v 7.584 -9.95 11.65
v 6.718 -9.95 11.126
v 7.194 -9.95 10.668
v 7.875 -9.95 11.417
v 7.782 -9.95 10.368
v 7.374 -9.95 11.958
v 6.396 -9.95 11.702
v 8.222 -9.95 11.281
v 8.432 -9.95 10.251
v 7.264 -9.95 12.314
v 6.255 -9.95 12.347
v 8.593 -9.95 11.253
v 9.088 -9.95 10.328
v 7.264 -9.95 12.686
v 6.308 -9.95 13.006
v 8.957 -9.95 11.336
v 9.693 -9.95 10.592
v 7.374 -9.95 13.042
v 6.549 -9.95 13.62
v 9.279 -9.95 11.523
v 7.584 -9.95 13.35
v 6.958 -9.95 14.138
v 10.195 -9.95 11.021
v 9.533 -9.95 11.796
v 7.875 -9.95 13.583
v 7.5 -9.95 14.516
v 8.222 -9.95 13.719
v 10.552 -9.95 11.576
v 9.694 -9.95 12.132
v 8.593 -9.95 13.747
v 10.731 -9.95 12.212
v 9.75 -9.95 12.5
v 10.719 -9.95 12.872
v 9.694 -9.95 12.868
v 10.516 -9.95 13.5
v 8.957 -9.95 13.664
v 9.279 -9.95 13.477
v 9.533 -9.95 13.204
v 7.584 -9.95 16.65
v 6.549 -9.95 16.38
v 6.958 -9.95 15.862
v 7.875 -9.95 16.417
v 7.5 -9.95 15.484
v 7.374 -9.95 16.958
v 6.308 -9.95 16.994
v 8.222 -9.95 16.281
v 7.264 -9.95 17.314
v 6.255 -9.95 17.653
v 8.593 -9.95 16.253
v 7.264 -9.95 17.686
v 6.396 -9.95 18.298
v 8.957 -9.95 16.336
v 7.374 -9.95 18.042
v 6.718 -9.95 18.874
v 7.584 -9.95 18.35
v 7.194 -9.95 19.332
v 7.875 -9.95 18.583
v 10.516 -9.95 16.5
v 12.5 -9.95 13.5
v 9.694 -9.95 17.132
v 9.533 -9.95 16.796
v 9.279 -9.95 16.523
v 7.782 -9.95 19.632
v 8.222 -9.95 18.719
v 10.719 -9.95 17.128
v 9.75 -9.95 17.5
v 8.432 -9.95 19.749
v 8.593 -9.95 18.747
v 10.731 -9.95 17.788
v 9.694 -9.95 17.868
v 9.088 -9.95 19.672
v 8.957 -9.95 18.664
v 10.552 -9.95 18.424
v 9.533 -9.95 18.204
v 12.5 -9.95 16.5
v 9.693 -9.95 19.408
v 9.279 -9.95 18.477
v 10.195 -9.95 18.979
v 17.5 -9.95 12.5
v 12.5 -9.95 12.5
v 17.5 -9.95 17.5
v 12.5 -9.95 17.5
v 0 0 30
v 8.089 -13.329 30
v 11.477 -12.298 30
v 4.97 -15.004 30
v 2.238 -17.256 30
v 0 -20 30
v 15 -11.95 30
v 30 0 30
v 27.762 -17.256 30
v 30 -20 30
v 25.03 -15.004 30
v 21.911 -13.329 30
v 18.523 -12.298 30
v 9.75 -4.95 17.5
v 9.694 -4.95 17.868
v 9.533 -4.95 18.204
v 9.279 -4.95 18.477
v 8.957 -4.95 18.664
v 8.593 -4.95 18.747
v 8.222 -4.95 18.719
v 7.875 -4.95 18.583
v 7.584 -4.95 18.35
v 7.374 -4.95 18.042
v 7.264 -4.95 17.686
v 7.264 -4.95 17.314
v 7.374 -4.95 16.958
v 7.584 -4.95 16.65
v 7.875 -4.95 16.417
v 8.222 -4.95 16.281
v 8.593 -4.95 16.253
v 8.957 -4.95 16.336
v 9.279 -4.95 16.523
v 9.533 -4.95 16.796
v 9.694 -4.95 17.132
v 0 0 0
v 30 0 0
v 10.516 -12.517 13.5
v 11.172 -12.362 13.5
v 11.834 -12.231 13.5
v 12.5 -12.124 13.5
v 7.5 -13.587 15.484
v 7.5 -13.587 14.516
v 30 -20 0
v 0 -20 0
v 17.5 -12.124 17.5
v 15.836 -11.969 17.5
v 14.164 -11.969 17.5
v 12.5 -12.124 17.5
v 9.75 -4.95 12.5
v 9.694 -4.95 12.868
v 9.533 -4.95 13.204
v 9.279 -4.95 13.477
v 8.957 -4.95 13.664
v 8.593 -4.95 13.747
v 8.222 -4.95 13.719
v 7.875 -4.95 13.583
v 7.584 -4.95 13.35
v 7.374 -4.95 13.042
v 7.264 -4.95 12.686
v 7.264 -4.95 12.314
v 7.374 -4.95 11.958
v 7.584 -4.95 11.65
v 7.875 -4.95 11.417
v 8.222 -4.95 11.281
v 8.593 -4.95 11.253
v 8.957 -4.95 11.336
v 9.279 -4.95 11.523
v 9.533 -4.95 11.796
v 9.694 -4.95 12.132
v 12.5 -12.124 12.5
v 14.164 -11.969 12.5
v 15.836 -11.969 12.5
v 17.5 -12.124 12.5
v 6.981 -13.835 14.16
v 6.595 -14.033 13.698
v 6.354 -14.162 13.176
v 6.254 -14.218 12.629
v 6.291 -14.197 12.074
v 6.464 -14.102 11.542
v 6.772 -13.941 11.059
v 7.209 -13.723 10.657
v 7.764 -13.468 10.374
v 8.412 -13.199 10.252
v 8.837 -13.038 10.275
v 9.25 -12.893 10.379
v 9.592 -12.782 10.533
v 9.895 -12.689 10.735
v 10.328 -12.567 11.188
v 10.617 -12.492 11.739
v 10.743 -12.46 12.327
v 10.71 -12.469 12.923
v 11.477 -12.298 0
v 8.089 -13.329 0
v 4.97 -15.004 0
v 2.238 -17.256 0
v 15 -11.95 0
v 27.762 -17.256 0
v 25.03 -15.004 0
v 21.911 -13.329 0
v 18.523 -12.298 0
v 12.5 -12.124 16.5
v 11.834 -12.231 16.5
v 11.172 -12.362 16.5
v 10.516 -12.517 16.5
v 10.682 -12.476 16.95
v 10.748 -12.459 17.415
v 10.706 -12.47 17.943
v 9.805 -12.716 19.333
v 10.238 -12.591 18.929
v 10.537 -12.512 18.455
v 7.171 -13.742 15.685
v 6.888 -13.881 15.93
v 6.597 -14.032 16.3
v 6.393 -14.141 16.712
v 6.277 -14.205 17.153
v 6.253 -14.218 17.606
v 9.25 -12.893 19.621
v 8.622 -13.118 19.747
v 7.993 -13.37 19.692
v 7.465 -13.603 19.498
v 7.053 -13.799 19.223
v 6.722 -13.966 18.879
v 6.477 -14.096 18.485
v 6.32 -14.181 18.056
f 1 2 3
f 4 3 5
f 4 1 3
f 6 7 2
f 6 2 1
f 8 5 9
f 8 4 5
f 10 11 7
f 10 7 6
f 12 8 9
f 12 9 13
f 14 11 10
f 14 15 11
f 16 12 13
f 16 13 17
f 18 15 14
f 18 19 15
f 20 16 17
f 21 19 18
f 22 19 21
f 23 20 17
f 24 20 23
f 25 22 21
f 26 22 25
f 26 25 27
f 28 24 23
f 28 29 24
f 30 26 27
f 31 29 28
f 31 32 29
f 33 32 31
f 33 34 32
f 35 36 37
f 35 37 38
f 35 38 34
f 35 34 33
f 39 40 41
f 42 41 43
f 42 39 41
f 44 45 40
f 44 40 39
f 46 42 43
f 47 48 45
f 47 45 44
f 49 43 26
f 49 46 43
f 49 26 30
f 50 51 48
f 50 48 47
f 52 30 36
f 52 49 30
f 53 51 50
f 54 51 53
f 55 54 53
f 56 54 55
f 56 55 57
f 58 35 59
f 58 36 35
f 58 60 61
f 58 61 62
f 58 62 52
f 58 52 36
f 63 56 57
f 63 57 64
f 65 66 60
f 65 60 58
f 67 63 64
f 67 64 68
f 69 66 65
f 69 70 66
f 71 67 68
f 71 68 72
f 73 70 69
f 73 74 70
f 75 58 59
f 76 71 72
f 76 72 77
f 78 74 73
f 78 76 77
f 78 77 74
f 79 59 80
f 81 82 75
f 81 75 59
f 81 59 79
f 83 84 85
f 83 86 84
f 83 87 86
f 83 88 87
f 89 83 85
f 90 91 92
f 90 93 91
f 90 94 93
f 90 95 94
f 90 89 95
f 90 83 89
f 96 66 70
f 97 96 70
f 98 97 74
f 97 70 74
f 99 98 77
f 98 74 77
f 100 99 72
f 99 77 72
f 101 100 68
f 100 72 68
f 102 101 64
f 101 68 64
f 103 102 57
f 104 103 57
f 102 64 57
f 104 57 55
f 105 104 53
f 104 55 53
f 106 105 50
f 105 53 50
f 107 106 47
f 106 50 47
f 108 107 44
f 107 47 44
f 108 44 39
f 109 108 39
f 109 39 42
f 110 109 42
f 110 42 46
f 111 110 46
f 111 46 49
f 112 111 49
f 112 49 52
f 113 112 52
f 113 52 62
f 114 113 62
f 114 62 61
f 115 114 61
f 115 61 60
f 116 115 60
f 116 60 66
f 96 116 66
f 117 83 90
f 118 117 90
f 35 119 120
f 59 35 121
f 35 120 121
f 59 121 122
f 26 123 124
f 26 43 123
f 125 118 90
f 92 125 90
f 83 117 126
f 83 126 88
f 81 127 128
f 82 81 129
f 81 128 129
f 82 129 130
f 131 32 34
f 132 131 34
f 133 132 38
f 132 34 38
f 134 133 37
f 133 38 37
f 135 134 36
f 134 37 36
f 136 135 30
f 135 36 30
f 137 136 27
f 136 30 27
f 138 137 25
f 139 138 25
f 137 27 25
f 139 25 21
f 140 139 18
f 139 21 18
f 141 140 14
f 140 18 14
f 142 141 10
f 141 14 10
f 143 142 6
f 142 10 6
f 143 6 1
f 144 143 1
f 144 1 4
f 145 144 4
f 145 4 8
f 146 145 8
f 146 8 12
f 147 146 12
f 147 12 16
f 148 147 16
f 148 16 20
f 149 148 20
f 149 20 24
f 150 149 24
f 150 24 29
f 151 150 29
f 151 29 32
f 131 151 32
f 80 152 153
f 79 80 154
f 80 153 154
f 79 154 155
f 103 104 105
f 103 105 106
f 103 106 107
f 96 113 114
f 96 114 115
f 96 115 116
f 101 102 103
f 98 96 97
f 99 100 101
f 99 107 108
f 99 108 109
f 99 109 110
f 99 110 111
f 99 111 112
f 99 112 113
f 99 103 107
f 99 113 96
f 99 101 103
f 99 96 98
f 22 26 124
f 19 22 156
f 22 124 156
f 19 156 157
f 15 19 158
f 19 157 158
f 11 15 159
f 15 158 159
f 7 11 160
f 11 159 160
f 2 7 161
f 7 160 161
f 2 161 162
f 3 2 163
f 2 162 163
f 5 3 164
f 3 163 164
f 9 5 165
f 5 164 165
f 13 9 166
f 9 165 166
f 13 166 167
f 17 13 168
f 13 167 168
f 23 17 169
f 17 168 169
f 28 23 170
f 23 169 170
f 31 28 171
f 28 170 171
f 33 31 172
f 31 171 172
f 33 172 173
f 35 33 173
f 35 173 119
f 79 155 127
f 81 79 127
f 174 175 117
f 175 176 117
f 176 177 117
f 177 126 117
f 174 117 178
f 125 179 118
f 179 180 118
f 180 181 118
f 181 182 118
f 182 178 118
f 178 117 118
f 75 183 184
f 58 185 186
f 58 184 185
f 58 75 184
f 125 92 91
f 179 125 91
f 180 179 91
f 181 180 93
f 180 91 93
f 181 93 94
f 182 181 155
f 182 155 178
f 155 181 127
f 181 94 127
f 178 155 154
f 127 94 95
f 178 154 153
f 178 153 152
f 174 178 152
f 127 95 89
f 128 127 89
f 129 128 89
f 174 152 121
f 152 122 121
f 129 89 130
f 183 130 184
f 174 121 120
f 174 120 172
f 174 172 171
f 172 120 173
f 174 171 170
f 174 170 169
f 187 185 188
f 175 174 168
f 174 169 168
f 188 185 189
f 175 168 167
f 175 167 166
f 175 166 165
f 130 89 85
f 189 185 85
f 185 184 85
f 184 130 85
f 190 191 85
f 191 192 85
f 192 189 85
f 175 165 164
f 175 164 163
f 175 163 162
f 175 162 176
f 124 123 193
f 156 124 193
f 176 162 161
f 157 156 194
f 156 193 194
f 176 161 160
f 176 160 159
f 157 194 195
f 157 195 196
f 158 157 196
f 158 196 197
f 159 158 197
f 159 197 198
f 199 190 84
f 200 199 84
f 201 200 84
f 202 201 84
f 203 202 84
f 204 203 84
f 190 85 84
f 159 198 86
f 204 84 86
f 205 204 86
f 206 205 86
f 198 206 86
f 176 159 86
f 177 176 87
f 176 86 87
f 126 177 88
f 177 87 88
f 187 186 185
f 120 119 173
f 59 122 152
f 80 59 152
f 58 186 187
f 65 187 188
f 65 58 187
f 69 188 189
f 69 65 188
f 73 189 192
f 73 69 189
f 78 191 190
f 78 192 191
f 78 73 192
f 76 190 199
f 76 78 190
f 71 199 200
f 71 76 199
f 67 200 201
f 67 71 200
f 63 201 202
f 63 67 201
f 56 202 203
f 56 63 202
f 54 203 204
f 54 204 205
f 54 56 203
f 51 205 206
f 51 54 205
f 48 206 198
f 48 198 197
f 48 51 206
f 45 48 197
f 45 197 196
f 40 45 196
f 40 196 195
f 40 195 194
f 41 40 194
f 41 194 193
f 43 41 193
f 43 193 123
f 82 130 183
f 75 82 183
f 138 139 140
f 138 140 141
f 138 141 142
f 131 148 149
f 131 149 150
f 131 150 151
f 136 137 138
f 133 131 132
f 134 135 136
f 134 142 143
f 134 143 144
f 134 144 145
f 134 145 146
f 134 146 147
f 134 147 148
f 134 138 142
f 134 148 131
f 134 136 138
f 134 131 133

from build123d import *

# Parameters (mm, degrees)
F0_W      = 30
F0_H      = 30
F1_DEPTH  = 20
F3_DEPTH  = 30.001
F8_DEPTH  = 3
F9_DEPTH  = 7.0511256289
F10_R     = 1.25
F11_DEPTH = 8
F12_DEPTH = 7.0511257289
F14_R     = 2.25
F15_DEPTH = 2.9431098966
F16_DEPTH = 7.1080158323


with BuildPart() as f1:
    # F0 (on Front) → F1 (new body)
    with BuildSketch(Plane.XZ):
        with Locations((15, 15)):
            Rectangle(F0_W, F0_H)
    extrude(amount=F1_DEPTH)

    # F2 (on face) → F3 (cut, through all)
    with BuildSketch(Plane.XY.offset(30)):
        with BuildLine():
            Line((0, -20), (30, -20))
            ThreePointArc((30, -20), (15, -11.9498743711), (0, -20))
        make_face()
    extrude(amount=-F3_DEPTH, mode=Mode.SUBTRACT)

    # F7 (on offset) → F8 (cut)
    with BuildSketch(Plane.XZ.offset(12.9498743711)):
        Polygon((17.5, 17.5), (15, 17.5), (12.5, 17.5), (12.5, 16.5), (12.5, 13.5), (12.5, 12.5), (17.5, 12.5), (17.5, 15), align=None)
        Polygon((12.5, 13.5), (12.5, 16.5), (7.5, 16.5), (7.5, 15), (7.5, 13.5), align=None)
    extrude(amount=-F8_DEPTH, mode=Mode.SUBTRACT)

    # F7 (on offset) → F9 (cut, through all)
    with BuildSketch(Plane.XZ.offset(12.9498743711)):
        Polygon((17.5, 17.5), (15, 17.5), (12.5, 17.5), (12.5, 16.5), (12.5, 13.5), (12.5, 12.5), (17.5, 12.5), (17.5, 15), align=None)
        Polygon((12.5, 13.5), (12.5, 16.5), (7.5, 16.5), (7.5, 15), (7.5, 13.5), align=None)
    extrude(amount=F9_DEPTH, mode=Mode.SUBTRACT)

    # F10 (on offset) → F11 (cut)
    with BuildSketch(Plane.XZ.offset(12.9498743711)):
        with Locations((8.5, 17.5)):
            Circle(F10_R)
        with Locations((8.5, 12.5)):
            Circle(F10_R)
    extrude(amount=-F11_DEPTH, mode=Mode.SUBTRACT)

    # F10 (on offset) → F12 (cut, through all)
    with BuildSketch(Plane.XZ.offset(12.9498743711)):
        with Locations((8.5, 17.5)):
            Circle(F10_R)
        with Locations((8.5, 12.5)):
            Circle(F10_R)
    extrude(amount=F12_DEPTH, mode=Mode.SUBTRACT)

    # F14 (on plane+point) → F15 (cut, through all)
    with BuildSketch(Plane.XZ.offset(12.8929842677)):
        with Locations((8.5, 17.5)):
            Circle(F14_R)
        with Locations((8.5, 12.5)):
            Circle(F14_R)
    extrude(amount=-F15_DEPTH, mode=Mode.SUBTRACT)

    # F14 (on plane+point) → F16 (cut, through all)
    with BuildSketch(Plane.XZ.offset(12.8929842677)):
        with Locations((8.5, 17.5)):
            Circle(F14_R)
        with Locations((8.5, 12.5)):
            Circle(F14_R)
    extrude(amount=F16_DEPTH, mode=Mode.SUBTRACT)


solid = f1.part
